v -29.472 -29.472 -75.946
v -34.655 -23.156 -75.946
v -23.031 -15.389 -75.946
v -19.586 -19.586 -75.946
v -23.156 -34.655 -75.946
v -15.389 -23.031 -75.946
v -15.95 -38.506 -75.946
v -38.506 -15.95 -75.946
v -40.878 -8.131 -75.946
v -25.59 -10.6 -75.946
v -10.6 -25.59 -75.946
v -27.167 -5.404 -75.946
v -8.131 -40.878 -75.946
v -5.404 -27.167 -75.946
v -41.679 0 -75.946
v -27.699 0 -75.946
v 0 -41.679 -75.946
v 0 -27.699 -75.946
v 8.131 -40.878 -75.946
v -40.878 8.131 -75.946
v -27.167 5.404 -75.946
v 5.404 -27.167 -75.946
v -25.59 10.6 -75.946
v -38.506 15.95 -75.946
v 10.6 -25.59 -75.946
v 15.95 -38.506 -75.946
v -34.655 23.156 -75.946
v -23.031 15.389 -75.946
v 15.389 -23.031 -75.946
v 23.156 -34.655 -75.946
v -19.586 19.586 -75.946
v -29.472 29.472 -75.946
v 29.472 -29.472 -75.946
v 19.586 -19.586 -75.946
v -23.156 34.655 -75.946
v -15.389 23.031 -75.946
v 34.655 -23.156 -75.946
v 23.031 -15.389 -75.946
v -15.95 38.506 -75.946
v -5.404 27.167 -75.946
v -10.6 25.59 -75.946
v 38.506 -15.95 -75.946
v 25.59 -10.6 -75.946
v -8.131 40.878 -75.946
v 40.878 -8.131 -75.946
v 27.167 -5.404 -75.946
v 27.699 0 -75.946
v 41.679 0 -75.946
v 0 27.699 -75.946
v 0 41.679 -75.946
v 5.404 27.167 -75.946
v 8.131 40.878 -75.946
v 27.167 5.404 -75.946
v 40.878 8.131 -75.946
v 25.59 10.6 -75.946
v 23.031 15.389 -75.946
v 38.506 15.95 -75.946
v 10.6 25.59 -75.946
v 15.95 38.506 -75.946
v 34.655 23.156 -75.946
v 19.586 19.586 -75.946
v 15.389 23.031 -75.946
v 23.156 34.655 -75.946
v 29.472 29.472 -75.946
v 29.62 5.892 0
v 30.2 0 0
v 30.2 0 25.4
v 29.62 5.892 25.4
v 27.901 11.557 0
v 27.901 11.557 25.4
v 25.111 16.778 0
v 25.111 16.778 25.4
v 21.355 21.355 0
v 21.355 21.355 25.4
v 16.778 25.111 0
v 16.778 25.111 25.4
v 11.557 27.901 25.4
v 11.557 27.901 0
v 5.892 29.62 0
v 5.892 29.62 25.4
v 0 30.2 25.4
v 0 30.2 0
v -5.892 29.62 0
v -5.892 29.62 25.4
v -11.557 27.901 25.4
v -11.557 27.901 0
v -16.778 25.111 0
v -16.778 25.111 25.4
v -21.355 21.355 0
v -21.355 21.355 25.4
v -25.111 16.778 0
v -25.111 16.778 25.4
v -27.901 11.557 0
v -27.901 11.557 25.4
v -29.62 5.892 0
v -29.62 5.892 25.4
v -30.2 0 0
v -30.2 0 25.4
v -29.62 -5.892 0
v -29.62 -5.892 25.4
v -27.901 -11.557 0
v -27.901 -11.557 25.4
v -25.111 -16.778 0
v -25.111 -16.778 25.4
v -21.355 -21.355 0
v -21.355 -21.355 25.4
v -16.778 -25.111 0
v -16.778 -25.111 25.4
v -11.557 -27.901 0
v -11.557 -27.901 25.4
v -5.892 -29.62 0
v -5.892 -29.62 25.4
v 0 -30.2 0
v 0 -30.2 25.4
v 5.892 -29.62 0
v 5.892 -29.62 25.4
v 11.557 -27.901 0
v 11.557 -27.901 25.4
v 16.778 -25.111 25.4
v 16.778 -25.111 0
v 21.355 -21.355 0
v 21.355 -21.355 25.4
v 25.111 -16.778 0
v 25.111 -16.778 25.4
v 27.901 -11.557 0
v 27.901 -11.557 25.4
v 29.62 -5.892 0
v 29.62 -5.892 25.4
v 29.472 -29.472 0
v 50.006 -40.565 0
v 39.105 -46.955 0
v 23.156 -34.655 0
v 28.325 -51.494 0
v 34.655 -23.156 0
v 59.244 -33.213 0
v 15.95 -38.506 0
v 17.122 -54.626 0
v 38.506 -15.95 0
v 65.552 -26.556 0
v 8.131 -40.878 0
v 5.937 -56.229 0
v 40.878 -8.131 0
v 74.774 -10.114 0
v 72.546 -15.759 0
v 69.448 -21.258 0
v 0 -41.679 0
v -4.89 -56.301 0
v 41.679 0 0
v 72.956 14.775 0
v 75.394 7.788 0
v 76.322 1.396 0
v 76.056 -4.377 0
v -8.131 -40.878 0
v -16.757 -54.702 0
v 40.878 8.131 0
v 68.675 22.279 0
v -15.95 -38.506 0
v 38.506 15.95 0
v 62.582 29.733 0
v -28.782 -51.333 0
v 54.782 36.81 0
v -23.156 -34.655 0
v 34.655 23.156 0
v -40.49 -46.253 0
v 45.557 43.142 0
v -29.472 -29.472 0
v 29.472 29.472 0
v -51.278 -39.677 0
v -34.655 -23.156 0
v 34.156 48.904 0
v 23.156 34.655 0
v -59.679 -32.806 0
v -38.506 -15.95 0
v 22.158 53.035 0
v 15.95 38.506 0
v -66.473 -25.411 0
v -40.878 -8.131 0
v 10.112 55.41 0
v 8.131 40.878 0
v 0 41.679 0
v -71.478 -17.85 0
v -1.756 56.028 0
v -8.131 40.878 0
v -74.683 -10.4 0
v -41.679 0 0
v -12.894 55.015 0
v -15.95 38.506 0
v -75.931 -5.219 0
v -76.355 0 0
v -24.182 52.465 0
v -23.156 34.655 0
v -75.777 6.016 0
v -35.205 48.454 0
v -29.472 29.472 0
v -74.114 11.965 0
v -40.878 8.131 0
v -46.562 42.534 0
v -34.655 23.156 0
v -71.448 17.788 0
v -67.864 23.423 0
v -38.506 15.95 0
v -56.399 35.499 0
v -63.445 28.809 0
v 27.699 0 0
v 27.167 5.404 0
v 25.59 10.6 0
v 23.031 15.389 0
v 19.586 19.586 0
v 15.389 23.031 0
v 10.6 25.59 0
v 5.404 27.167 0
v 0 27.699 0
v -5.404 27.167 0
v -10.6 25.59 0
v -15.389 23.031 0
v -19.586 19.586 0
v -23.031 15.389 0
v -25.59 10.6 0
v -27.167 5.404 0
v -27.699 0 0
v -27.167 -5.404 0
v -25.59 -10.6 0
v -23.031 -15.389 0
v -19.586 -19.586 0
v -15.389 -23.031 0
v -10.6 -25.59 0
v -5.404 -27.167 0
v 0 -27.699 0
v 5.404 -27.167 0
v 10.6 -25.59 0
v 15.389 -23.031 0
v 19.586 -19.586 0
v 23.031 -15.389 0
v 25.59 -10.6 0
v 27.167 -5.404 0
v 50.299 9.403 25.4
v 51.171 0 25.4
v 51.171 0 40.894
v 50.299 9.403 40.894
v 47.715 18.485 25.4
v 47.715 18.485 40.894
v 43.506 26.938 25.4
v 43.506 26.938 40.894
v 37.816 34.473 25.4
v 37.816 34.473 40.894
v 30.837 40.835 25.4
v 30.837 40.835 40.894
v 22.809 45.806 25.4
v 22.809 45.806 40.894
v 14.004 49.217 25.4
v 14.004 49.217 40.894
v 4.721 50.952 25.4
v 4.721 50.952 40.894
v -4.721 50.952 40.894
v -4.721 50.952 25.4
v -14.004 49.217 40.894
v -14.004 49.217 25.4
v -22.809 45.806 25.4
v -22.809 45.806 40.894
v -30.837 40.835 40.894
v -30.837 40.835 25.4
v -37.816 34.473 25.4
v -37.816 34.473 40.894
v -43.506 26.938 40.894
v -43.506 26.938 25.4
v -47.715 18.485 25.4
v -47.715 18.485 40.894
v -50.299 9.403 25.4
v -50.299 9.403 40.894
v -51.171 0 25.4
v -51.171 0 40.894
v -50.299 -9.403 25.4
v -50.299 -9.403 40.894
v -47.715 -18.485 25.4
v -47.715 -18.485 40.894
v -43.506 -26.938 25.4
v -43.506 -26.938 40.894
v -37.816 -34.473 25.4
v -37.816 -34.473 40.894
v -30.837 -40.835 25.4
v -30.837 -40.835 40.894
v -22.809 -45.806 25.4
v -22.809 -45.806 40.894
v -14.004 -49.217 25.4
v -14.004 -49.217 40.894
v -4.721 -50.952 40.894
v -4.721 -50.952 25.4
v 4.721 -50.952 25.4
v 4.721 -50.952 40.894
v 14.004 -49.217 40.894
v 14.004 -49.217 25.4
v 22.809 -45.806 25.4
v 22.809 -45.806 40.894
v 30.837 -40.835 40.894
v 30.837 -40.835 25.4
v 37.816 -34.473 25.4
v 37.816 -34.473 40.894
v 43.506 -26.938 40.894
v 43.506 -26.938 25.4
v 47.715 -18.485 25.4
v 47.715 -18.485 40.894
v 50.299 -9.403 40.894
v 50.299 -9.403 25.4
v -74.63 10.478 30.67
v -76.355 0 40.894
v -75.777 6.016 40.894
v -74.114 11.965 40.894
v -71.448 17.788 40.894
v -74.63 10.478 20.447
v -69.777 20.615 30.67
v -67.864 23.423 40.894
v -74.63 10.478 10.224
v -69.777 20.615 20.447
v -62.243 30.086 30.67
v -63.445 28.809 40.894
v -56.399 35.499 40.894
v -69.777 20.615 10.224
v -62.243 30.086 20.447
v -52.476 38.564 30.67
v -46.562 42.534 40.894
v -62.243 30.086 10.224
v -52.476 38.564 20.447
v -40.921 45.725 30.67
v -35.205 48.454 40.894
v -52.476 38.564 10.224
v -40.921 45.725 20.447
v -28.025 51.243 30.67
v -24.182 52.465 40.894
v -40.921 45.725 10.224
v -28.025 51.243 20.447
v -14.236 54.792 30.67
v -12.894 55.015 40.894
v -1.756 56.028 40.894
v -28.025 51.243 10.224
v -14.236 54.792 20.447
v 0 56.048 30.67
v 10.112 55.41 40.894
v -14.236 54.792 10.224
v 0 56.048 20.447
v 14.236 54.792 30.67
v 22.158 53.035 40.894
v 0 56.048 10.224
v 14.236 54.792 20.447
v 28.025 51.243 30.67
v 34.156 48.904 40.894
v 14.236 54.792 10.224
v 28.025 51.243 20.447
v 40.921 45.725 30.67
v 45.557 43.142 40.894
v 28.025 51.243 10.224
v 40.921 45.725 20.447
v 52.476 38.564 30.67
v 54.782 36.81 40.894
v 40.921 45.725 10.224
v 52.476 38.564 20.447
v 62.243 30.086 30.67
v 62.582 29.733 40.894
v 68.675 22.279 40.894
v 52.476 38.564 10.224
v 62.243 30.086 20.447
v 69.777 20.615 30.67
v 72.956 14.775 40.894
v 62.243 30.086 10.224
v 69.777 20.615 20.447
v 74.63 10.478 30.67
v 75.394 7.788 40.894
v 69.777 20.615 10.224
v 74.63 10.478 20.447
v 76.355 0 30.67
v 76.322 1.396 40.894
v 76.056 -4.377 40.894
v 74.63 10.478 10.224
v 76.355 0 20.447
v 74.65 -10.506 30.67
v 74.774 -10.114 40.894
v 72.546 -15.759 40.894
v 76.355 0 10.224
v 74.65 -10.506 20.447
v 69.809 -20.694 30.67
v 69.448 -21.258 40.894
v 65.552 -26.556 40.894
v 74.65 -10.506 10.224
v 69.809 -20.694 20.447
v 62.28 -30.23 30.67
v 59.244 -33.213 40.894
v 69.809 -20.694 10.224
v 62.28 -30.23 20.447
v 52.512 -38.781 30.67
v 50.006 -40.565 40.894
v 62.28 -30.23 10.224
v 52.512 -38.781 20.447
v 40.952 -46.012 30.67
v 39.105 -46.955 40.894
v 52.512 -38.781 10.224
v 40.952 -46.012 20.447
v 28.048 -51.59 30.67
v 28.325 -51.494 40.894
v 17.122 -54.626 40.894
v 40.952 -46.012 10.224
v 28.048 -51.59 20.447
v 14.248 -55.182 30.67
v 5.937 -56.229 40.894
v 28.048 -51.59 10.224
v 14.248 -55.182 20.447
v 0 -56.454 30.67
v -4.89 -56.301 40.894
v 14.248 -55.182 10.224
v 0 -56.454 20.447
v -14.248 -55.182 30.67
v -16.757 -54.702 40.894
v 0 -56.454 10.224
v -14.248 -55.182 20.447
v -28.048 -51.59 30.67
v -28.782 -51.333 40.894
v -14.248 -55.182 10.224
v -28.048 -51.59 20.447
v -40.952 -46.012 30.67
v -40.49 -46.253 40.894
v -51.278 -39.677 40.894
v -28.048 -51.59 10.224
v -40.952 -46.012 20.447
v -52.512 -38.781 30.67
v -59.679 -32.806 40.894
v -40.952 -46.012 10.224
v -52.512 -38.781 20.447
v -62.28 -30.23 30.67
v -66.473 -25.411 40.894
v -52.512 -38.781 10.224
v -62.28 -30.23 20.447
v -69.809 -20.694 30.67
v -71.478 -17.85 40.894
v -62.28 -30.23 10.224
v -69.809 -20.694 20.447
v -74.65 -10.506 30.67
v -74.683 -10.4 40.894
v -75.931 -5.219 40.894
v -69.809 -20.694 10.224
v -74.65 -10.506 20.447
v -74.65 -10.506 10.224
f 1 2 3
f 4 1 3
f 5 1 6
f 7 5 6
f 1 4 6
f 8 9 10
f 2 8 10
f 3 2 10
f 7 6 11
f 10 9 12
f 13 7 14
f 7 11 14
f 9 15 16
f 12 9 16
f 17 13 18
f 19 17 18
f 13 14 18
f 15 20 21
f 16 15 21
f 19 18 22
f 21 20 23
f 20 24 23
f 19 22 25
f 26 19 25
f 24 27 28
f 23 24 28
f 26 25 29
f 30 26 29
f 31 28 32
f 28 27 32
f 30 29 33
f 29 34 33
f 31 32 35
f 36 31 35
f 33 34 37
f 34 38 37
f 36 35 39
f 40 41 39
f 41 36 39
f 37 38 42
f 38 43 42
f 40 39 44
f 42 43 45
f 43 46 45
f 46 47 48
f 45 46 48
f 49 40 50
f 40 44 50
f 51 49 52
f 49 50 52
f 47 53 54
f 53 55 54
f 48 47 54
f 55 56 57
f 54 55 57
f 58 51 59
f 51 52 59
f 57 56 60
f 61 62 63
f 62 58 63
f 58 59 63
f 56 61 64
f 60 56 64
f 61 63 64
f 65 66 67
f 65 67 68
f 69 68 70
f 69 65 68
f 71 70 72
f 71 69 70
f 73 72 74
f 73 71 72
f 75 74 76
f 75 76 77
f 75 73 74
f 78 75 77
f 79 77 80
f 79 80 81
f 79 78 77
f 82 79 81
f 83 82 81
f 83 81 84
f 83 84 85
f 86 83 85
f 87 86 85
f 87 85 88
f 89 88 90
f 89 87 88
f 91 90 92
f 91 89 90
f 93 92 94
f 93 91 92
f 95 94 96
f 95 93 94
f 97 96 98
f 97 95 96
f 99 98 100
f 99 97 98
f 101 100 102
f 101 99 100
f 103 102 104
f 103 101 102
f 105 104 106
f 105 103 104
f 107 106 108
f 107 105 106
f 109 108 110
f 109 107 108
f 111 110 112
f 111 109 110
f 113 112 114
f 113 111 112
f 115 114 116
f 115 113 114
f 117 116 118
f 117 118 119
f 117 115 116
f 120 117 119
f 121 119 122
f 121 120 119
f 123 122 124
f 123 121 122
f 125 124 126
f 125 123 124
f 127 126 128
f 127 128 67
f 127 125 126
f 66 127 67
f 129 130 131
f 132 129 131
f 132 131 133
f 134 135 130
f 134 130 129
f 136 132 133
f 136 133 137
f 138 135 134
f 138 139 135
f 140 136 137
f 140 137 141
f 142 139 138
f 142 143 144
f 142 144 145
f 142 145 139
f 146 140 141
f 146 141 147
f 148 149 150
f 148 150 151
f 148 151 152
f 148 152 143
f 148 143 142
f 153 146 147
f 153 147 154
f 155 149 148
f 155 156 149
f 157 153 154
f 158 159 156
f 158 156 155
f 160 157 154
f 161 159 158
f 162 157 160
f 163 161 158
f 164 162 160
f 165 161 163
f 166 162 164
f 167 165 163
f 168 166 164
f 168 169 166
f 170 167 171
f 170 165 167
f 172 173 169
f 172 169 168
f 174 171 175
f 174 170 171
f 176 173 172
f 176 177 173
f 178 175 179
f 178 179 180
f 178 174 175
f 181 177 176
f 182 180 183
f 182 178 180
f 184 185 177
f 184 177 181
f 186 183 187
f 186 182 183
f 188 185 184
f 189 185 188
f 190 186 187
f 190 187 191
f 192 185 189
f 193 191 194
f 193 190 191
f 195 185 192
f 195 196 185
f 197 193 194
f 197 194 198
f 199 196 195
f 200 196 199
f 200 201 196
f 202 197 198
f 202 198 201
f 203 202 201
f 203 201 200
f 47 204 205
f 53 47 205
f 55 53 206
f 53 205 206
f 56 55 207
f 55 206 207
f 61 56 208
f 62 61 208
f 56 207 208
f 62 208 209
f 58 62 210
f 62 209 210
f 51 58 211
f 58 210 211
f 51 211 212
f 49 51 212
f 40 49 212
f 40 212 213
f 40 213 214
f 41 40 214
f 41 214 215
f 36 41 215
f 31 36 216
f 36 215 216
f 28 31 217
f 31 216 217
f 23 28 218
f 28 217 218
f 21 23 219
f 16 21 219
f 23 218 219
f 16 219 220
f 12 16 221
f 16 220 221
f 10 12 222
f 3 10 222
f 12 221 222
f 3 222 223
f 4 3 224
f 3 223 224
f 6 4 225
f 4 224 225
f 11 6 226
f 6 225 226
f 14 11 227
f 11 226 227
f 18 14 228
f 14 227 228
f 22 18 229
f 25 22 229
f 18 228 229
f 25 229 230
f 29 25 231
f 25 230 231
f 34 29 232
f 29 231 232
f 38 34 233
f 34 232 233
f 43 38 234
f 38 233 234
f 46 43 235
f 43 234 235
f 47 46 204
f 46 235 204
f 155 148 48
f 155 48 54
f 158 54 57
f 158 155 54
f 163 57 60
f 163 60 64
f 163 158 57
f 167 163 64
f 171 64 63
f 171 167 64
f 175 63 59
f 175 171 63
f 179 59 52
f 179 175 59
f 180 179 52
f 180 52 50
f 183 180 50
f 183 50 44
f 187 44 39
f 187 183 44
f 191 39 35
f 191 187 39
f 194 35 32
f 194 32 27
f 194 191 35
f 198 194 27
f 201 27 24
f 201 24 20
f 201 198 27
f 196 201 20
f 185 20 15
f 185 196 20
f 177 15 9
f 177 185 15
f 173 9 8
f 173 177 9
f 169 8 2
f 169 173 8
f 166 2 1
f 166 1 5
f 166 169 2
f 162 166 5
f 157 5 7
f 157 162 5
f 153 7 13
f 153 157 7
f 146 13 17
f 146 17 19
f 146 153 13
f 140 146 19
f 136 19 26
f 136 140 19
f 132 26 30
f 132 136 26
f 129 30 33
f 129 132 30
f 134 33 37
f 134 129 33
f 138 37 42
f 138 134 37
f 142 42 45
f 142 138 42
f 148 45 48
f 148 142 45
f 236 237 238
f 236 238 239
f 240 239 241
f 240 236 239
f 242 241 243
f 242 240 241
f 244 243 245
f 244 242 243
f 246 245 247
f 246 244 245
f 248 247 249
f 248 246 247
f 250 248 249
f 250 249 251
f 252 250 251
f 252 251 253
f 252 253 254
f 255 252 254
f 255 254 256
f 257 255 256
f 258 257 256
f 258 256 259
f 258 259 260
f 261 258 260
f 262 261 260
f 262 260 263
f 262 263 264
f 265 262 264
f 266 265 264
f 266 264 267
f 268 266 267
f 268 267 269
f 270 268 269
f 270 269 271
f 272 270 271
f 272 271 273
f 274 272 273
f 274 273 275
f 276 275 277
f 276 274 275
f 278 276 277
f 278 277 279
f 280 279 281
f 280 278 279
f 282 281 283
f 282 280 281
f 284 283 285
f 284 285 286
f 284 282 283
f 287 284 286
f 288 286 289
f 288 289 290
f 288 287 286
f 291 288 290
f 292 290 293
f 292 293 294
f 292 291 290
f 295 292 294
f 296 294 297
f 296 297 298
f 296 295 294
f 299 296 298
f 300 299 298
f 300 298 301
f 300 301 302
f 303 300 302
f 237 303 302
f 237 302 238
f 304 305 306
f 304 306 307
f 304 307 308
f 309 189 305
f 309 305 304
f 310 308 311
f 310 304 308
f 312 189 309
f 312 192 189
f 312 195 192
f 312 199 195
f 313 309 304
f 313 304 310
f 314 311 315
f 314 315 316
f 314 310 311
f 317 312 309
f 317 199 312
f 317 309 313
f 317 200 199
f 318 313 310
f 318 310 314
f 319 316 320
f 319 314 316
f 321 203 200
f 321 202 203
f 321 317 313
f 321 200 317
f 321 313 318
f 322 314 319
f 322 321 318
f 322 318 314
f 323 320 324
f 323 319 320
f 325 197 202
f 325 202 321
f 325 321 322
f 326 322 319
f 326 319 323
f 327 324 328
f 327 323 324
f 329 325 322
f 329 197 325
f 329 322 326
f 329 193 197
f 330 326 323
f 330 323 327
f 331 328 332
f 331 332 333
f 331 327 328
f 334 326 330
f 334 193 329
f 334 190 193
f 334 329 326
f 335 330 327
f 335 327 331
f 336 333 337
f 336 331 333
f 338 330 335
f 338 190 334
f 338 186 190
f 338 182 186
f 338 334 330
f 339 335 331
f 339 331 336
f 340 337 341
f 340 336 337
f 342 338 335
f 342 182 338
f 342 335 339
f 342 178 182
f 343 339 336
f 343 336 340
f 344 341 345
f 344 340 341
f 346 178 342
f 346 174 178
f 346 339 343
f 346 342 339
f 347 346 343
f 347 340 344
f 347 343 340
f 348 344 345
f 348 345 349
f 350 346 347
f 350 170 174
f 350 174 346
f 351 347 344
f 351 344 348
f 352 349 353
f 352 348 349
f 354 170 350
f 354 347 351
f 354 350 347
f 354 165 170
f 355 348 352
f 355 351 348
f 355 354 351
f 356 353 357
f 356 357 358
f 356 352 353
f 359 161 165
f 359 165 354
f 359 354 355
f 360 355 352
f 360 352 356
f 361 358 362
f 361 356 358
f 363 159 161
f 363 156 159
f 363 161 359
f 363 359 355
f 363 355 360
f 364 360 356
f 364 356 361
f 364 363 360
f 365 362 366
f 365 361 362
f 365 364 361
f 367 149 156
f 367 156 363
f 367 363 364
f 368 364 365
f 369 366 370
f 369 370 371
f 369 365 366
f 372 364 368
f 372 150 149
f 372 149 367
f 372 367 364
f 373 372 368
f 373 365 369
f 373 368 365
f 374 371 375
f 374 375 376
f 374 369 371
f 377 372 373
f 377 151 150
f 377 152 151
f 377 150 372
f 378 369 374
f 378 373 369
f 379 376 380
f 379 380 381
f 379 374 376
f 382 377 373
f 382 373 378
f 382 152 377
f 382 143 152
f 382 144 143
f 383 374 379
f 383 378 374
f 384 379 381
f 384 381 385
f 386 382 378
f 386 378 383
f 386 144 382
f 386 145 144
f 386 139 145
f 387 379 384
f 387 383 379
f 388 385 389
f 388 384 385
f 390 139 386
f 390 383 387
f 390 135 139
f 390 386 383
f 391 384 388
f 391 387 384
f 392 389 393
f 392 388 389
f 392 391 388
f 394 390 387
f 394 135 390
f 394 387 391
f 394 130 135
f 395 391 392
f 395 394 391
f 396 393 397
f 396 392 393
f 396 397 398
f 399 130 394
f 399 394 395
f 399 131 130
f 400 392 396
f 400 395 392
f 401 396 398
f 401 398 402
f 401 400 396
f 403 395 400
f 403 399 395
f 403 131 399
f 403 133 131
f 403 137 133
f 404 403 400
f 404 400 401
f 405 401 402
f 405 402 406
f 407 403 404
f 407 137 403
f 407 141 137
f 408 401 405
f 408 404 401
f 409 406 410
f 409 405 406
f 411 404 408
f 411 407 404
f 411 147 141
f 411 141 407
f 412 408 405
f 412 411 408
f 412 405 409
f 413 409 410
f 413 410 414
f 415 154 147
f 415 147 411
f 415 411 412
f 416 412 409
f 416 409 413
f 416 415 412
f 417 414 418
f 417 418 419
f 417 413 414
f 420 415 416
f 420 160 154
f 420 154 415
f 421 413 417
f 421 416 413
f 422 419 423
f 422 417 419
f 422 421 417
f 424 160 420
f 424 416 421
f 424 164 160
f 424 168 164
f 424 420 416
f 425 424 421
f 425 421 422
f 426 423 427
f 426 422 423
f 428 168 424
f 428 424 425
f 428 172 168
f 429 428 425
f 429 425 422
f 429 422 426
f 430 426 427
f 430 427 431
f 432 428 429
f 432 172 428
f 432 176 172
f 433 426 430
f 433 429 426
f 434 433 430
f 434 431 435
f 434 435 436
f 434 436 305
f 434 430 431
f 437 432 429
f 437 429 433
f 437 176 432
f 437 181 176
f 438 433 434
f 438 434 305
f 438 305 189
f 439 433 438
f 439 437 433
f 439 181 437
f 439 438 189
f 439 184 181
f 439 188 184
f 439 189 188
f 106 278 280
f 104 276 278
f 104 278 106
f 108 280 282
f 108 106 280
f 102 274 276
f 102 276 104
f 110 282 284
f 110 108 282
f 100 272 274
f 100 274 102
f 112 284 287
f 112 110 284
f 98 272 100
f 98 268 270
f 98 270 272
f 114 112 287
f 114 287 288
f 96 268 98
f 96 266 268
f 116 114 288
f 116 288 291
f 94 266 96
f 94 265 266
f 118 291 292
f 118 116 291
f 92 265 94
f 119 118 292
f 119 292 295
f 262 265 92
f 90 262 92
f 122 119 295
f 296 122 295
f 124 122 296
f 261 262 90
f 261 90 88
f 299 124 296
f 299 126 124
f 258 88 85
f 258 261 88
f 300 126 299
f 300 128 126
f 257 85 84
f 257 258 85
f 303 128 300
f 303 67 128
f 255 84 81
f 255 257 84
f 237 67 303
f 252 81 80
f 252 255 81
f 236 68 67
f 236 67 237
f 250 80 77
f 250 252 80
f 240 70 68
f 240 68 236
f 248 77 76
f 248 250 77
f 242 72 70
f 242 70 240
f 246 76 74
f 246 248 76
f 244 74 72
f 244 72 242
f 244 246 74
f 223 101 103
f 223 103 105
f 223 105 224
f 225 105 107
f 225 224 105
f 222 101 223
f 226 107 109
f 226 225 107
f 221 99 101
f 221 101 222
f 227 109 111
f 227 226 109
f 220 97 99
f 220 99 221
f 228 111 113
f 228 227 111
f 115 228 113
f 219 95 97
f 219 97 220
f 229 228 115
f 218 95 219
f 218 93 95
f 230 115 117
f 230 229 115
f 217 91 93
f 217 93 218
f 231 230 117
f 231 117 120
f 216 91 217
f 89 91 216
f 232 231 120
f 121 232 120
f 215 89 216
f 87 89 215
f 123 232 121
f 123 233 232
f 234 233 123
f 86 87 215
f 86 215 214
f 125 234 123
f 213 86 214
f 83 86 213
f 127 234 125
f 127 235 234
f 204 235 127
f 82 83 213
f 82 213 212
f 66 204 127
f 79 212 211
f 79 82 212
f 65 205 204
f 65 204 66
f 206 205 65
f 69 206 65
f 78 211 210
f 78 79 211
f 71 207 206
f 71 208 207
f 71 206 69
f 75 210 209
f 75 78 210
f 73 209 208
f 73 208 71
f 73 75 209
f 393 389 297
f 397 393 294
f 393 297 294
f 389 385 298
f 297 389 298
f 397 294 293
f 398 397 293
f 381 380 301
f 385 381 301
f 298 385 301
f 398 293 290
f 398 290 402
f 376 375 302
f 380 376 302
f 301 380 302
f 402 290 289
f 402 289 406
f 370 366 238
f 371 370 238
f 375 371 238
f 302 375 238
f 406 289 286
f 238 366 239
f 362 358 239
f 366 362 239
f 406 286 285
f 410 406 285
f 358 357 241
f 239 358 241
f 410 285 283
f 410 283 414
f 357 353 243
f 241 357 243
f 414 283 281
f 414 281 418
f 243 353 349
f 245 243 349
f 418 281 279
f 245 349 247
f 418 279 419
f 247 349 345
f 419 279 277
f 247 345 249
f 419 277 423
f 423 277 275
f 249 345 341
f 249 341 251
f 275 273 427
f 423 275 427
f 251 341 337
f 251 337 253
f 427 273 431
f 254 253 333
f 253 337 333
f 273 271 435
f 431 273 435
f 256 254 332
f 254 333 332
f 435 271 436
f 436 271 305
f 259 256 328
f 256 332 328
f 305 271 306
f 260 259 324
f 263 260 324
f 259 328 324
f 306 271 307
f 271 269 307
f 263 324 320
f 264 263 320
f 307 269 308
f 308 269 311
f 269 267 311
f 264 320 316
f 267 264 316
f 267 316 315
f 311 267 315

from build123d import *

# Parameters (mm, degrees)
F0_R     = 51.1706883449
F0_R_2   = 30.2002923657
F1_DEPTH = 25.4
F2_DEPTH = 40.894
F3_R     = 41.6790875825
F3_R_2   = 27.6989466926
F4_DEPTH = 75.946


with BuildPart() as f1:
    # F0 (on Top) → F1 (new body)
    with BuildSketch(Plane.XY):
        Circle(F0_R)
        Circle(F0_R_2, mode=Mode.SUBTRACT)
    extrude(amount=F1_DEPTH)

    # F0 (on Top) → F2 (join)
    with BuildSketch(Plane.XY):
        with BuildLine():
            add(Edge.make_bspline(
                [(-76.3547196984, 0), (-76.3224163005, 28.1073778219), (0, 83.9878589563), (114.5321205996, 0.1316301487), (0, -84.7644166463), (-76.3870641482, -28.1430973298), (-76.3547196984, 0)],
                knots=[0, 0, 0, 0, 0.249841248, 0.4996824959, 0.749841248, 1, 1, 1, 1], degree=3))
        make_face()
        Circle(F0_R, mode=Mode.SUBTRACT)
    extrude(amount=F2_DEPTH)

    # F3 (on Top) → F4 (join)
    with BuildSketch(Plane.XY):
        Circle(F3_R)
        Circle(F3_R_2, mode=Mode.SUBTRACT)
    extrude(amount=-F4_DEPTH)


solid = f1.part
